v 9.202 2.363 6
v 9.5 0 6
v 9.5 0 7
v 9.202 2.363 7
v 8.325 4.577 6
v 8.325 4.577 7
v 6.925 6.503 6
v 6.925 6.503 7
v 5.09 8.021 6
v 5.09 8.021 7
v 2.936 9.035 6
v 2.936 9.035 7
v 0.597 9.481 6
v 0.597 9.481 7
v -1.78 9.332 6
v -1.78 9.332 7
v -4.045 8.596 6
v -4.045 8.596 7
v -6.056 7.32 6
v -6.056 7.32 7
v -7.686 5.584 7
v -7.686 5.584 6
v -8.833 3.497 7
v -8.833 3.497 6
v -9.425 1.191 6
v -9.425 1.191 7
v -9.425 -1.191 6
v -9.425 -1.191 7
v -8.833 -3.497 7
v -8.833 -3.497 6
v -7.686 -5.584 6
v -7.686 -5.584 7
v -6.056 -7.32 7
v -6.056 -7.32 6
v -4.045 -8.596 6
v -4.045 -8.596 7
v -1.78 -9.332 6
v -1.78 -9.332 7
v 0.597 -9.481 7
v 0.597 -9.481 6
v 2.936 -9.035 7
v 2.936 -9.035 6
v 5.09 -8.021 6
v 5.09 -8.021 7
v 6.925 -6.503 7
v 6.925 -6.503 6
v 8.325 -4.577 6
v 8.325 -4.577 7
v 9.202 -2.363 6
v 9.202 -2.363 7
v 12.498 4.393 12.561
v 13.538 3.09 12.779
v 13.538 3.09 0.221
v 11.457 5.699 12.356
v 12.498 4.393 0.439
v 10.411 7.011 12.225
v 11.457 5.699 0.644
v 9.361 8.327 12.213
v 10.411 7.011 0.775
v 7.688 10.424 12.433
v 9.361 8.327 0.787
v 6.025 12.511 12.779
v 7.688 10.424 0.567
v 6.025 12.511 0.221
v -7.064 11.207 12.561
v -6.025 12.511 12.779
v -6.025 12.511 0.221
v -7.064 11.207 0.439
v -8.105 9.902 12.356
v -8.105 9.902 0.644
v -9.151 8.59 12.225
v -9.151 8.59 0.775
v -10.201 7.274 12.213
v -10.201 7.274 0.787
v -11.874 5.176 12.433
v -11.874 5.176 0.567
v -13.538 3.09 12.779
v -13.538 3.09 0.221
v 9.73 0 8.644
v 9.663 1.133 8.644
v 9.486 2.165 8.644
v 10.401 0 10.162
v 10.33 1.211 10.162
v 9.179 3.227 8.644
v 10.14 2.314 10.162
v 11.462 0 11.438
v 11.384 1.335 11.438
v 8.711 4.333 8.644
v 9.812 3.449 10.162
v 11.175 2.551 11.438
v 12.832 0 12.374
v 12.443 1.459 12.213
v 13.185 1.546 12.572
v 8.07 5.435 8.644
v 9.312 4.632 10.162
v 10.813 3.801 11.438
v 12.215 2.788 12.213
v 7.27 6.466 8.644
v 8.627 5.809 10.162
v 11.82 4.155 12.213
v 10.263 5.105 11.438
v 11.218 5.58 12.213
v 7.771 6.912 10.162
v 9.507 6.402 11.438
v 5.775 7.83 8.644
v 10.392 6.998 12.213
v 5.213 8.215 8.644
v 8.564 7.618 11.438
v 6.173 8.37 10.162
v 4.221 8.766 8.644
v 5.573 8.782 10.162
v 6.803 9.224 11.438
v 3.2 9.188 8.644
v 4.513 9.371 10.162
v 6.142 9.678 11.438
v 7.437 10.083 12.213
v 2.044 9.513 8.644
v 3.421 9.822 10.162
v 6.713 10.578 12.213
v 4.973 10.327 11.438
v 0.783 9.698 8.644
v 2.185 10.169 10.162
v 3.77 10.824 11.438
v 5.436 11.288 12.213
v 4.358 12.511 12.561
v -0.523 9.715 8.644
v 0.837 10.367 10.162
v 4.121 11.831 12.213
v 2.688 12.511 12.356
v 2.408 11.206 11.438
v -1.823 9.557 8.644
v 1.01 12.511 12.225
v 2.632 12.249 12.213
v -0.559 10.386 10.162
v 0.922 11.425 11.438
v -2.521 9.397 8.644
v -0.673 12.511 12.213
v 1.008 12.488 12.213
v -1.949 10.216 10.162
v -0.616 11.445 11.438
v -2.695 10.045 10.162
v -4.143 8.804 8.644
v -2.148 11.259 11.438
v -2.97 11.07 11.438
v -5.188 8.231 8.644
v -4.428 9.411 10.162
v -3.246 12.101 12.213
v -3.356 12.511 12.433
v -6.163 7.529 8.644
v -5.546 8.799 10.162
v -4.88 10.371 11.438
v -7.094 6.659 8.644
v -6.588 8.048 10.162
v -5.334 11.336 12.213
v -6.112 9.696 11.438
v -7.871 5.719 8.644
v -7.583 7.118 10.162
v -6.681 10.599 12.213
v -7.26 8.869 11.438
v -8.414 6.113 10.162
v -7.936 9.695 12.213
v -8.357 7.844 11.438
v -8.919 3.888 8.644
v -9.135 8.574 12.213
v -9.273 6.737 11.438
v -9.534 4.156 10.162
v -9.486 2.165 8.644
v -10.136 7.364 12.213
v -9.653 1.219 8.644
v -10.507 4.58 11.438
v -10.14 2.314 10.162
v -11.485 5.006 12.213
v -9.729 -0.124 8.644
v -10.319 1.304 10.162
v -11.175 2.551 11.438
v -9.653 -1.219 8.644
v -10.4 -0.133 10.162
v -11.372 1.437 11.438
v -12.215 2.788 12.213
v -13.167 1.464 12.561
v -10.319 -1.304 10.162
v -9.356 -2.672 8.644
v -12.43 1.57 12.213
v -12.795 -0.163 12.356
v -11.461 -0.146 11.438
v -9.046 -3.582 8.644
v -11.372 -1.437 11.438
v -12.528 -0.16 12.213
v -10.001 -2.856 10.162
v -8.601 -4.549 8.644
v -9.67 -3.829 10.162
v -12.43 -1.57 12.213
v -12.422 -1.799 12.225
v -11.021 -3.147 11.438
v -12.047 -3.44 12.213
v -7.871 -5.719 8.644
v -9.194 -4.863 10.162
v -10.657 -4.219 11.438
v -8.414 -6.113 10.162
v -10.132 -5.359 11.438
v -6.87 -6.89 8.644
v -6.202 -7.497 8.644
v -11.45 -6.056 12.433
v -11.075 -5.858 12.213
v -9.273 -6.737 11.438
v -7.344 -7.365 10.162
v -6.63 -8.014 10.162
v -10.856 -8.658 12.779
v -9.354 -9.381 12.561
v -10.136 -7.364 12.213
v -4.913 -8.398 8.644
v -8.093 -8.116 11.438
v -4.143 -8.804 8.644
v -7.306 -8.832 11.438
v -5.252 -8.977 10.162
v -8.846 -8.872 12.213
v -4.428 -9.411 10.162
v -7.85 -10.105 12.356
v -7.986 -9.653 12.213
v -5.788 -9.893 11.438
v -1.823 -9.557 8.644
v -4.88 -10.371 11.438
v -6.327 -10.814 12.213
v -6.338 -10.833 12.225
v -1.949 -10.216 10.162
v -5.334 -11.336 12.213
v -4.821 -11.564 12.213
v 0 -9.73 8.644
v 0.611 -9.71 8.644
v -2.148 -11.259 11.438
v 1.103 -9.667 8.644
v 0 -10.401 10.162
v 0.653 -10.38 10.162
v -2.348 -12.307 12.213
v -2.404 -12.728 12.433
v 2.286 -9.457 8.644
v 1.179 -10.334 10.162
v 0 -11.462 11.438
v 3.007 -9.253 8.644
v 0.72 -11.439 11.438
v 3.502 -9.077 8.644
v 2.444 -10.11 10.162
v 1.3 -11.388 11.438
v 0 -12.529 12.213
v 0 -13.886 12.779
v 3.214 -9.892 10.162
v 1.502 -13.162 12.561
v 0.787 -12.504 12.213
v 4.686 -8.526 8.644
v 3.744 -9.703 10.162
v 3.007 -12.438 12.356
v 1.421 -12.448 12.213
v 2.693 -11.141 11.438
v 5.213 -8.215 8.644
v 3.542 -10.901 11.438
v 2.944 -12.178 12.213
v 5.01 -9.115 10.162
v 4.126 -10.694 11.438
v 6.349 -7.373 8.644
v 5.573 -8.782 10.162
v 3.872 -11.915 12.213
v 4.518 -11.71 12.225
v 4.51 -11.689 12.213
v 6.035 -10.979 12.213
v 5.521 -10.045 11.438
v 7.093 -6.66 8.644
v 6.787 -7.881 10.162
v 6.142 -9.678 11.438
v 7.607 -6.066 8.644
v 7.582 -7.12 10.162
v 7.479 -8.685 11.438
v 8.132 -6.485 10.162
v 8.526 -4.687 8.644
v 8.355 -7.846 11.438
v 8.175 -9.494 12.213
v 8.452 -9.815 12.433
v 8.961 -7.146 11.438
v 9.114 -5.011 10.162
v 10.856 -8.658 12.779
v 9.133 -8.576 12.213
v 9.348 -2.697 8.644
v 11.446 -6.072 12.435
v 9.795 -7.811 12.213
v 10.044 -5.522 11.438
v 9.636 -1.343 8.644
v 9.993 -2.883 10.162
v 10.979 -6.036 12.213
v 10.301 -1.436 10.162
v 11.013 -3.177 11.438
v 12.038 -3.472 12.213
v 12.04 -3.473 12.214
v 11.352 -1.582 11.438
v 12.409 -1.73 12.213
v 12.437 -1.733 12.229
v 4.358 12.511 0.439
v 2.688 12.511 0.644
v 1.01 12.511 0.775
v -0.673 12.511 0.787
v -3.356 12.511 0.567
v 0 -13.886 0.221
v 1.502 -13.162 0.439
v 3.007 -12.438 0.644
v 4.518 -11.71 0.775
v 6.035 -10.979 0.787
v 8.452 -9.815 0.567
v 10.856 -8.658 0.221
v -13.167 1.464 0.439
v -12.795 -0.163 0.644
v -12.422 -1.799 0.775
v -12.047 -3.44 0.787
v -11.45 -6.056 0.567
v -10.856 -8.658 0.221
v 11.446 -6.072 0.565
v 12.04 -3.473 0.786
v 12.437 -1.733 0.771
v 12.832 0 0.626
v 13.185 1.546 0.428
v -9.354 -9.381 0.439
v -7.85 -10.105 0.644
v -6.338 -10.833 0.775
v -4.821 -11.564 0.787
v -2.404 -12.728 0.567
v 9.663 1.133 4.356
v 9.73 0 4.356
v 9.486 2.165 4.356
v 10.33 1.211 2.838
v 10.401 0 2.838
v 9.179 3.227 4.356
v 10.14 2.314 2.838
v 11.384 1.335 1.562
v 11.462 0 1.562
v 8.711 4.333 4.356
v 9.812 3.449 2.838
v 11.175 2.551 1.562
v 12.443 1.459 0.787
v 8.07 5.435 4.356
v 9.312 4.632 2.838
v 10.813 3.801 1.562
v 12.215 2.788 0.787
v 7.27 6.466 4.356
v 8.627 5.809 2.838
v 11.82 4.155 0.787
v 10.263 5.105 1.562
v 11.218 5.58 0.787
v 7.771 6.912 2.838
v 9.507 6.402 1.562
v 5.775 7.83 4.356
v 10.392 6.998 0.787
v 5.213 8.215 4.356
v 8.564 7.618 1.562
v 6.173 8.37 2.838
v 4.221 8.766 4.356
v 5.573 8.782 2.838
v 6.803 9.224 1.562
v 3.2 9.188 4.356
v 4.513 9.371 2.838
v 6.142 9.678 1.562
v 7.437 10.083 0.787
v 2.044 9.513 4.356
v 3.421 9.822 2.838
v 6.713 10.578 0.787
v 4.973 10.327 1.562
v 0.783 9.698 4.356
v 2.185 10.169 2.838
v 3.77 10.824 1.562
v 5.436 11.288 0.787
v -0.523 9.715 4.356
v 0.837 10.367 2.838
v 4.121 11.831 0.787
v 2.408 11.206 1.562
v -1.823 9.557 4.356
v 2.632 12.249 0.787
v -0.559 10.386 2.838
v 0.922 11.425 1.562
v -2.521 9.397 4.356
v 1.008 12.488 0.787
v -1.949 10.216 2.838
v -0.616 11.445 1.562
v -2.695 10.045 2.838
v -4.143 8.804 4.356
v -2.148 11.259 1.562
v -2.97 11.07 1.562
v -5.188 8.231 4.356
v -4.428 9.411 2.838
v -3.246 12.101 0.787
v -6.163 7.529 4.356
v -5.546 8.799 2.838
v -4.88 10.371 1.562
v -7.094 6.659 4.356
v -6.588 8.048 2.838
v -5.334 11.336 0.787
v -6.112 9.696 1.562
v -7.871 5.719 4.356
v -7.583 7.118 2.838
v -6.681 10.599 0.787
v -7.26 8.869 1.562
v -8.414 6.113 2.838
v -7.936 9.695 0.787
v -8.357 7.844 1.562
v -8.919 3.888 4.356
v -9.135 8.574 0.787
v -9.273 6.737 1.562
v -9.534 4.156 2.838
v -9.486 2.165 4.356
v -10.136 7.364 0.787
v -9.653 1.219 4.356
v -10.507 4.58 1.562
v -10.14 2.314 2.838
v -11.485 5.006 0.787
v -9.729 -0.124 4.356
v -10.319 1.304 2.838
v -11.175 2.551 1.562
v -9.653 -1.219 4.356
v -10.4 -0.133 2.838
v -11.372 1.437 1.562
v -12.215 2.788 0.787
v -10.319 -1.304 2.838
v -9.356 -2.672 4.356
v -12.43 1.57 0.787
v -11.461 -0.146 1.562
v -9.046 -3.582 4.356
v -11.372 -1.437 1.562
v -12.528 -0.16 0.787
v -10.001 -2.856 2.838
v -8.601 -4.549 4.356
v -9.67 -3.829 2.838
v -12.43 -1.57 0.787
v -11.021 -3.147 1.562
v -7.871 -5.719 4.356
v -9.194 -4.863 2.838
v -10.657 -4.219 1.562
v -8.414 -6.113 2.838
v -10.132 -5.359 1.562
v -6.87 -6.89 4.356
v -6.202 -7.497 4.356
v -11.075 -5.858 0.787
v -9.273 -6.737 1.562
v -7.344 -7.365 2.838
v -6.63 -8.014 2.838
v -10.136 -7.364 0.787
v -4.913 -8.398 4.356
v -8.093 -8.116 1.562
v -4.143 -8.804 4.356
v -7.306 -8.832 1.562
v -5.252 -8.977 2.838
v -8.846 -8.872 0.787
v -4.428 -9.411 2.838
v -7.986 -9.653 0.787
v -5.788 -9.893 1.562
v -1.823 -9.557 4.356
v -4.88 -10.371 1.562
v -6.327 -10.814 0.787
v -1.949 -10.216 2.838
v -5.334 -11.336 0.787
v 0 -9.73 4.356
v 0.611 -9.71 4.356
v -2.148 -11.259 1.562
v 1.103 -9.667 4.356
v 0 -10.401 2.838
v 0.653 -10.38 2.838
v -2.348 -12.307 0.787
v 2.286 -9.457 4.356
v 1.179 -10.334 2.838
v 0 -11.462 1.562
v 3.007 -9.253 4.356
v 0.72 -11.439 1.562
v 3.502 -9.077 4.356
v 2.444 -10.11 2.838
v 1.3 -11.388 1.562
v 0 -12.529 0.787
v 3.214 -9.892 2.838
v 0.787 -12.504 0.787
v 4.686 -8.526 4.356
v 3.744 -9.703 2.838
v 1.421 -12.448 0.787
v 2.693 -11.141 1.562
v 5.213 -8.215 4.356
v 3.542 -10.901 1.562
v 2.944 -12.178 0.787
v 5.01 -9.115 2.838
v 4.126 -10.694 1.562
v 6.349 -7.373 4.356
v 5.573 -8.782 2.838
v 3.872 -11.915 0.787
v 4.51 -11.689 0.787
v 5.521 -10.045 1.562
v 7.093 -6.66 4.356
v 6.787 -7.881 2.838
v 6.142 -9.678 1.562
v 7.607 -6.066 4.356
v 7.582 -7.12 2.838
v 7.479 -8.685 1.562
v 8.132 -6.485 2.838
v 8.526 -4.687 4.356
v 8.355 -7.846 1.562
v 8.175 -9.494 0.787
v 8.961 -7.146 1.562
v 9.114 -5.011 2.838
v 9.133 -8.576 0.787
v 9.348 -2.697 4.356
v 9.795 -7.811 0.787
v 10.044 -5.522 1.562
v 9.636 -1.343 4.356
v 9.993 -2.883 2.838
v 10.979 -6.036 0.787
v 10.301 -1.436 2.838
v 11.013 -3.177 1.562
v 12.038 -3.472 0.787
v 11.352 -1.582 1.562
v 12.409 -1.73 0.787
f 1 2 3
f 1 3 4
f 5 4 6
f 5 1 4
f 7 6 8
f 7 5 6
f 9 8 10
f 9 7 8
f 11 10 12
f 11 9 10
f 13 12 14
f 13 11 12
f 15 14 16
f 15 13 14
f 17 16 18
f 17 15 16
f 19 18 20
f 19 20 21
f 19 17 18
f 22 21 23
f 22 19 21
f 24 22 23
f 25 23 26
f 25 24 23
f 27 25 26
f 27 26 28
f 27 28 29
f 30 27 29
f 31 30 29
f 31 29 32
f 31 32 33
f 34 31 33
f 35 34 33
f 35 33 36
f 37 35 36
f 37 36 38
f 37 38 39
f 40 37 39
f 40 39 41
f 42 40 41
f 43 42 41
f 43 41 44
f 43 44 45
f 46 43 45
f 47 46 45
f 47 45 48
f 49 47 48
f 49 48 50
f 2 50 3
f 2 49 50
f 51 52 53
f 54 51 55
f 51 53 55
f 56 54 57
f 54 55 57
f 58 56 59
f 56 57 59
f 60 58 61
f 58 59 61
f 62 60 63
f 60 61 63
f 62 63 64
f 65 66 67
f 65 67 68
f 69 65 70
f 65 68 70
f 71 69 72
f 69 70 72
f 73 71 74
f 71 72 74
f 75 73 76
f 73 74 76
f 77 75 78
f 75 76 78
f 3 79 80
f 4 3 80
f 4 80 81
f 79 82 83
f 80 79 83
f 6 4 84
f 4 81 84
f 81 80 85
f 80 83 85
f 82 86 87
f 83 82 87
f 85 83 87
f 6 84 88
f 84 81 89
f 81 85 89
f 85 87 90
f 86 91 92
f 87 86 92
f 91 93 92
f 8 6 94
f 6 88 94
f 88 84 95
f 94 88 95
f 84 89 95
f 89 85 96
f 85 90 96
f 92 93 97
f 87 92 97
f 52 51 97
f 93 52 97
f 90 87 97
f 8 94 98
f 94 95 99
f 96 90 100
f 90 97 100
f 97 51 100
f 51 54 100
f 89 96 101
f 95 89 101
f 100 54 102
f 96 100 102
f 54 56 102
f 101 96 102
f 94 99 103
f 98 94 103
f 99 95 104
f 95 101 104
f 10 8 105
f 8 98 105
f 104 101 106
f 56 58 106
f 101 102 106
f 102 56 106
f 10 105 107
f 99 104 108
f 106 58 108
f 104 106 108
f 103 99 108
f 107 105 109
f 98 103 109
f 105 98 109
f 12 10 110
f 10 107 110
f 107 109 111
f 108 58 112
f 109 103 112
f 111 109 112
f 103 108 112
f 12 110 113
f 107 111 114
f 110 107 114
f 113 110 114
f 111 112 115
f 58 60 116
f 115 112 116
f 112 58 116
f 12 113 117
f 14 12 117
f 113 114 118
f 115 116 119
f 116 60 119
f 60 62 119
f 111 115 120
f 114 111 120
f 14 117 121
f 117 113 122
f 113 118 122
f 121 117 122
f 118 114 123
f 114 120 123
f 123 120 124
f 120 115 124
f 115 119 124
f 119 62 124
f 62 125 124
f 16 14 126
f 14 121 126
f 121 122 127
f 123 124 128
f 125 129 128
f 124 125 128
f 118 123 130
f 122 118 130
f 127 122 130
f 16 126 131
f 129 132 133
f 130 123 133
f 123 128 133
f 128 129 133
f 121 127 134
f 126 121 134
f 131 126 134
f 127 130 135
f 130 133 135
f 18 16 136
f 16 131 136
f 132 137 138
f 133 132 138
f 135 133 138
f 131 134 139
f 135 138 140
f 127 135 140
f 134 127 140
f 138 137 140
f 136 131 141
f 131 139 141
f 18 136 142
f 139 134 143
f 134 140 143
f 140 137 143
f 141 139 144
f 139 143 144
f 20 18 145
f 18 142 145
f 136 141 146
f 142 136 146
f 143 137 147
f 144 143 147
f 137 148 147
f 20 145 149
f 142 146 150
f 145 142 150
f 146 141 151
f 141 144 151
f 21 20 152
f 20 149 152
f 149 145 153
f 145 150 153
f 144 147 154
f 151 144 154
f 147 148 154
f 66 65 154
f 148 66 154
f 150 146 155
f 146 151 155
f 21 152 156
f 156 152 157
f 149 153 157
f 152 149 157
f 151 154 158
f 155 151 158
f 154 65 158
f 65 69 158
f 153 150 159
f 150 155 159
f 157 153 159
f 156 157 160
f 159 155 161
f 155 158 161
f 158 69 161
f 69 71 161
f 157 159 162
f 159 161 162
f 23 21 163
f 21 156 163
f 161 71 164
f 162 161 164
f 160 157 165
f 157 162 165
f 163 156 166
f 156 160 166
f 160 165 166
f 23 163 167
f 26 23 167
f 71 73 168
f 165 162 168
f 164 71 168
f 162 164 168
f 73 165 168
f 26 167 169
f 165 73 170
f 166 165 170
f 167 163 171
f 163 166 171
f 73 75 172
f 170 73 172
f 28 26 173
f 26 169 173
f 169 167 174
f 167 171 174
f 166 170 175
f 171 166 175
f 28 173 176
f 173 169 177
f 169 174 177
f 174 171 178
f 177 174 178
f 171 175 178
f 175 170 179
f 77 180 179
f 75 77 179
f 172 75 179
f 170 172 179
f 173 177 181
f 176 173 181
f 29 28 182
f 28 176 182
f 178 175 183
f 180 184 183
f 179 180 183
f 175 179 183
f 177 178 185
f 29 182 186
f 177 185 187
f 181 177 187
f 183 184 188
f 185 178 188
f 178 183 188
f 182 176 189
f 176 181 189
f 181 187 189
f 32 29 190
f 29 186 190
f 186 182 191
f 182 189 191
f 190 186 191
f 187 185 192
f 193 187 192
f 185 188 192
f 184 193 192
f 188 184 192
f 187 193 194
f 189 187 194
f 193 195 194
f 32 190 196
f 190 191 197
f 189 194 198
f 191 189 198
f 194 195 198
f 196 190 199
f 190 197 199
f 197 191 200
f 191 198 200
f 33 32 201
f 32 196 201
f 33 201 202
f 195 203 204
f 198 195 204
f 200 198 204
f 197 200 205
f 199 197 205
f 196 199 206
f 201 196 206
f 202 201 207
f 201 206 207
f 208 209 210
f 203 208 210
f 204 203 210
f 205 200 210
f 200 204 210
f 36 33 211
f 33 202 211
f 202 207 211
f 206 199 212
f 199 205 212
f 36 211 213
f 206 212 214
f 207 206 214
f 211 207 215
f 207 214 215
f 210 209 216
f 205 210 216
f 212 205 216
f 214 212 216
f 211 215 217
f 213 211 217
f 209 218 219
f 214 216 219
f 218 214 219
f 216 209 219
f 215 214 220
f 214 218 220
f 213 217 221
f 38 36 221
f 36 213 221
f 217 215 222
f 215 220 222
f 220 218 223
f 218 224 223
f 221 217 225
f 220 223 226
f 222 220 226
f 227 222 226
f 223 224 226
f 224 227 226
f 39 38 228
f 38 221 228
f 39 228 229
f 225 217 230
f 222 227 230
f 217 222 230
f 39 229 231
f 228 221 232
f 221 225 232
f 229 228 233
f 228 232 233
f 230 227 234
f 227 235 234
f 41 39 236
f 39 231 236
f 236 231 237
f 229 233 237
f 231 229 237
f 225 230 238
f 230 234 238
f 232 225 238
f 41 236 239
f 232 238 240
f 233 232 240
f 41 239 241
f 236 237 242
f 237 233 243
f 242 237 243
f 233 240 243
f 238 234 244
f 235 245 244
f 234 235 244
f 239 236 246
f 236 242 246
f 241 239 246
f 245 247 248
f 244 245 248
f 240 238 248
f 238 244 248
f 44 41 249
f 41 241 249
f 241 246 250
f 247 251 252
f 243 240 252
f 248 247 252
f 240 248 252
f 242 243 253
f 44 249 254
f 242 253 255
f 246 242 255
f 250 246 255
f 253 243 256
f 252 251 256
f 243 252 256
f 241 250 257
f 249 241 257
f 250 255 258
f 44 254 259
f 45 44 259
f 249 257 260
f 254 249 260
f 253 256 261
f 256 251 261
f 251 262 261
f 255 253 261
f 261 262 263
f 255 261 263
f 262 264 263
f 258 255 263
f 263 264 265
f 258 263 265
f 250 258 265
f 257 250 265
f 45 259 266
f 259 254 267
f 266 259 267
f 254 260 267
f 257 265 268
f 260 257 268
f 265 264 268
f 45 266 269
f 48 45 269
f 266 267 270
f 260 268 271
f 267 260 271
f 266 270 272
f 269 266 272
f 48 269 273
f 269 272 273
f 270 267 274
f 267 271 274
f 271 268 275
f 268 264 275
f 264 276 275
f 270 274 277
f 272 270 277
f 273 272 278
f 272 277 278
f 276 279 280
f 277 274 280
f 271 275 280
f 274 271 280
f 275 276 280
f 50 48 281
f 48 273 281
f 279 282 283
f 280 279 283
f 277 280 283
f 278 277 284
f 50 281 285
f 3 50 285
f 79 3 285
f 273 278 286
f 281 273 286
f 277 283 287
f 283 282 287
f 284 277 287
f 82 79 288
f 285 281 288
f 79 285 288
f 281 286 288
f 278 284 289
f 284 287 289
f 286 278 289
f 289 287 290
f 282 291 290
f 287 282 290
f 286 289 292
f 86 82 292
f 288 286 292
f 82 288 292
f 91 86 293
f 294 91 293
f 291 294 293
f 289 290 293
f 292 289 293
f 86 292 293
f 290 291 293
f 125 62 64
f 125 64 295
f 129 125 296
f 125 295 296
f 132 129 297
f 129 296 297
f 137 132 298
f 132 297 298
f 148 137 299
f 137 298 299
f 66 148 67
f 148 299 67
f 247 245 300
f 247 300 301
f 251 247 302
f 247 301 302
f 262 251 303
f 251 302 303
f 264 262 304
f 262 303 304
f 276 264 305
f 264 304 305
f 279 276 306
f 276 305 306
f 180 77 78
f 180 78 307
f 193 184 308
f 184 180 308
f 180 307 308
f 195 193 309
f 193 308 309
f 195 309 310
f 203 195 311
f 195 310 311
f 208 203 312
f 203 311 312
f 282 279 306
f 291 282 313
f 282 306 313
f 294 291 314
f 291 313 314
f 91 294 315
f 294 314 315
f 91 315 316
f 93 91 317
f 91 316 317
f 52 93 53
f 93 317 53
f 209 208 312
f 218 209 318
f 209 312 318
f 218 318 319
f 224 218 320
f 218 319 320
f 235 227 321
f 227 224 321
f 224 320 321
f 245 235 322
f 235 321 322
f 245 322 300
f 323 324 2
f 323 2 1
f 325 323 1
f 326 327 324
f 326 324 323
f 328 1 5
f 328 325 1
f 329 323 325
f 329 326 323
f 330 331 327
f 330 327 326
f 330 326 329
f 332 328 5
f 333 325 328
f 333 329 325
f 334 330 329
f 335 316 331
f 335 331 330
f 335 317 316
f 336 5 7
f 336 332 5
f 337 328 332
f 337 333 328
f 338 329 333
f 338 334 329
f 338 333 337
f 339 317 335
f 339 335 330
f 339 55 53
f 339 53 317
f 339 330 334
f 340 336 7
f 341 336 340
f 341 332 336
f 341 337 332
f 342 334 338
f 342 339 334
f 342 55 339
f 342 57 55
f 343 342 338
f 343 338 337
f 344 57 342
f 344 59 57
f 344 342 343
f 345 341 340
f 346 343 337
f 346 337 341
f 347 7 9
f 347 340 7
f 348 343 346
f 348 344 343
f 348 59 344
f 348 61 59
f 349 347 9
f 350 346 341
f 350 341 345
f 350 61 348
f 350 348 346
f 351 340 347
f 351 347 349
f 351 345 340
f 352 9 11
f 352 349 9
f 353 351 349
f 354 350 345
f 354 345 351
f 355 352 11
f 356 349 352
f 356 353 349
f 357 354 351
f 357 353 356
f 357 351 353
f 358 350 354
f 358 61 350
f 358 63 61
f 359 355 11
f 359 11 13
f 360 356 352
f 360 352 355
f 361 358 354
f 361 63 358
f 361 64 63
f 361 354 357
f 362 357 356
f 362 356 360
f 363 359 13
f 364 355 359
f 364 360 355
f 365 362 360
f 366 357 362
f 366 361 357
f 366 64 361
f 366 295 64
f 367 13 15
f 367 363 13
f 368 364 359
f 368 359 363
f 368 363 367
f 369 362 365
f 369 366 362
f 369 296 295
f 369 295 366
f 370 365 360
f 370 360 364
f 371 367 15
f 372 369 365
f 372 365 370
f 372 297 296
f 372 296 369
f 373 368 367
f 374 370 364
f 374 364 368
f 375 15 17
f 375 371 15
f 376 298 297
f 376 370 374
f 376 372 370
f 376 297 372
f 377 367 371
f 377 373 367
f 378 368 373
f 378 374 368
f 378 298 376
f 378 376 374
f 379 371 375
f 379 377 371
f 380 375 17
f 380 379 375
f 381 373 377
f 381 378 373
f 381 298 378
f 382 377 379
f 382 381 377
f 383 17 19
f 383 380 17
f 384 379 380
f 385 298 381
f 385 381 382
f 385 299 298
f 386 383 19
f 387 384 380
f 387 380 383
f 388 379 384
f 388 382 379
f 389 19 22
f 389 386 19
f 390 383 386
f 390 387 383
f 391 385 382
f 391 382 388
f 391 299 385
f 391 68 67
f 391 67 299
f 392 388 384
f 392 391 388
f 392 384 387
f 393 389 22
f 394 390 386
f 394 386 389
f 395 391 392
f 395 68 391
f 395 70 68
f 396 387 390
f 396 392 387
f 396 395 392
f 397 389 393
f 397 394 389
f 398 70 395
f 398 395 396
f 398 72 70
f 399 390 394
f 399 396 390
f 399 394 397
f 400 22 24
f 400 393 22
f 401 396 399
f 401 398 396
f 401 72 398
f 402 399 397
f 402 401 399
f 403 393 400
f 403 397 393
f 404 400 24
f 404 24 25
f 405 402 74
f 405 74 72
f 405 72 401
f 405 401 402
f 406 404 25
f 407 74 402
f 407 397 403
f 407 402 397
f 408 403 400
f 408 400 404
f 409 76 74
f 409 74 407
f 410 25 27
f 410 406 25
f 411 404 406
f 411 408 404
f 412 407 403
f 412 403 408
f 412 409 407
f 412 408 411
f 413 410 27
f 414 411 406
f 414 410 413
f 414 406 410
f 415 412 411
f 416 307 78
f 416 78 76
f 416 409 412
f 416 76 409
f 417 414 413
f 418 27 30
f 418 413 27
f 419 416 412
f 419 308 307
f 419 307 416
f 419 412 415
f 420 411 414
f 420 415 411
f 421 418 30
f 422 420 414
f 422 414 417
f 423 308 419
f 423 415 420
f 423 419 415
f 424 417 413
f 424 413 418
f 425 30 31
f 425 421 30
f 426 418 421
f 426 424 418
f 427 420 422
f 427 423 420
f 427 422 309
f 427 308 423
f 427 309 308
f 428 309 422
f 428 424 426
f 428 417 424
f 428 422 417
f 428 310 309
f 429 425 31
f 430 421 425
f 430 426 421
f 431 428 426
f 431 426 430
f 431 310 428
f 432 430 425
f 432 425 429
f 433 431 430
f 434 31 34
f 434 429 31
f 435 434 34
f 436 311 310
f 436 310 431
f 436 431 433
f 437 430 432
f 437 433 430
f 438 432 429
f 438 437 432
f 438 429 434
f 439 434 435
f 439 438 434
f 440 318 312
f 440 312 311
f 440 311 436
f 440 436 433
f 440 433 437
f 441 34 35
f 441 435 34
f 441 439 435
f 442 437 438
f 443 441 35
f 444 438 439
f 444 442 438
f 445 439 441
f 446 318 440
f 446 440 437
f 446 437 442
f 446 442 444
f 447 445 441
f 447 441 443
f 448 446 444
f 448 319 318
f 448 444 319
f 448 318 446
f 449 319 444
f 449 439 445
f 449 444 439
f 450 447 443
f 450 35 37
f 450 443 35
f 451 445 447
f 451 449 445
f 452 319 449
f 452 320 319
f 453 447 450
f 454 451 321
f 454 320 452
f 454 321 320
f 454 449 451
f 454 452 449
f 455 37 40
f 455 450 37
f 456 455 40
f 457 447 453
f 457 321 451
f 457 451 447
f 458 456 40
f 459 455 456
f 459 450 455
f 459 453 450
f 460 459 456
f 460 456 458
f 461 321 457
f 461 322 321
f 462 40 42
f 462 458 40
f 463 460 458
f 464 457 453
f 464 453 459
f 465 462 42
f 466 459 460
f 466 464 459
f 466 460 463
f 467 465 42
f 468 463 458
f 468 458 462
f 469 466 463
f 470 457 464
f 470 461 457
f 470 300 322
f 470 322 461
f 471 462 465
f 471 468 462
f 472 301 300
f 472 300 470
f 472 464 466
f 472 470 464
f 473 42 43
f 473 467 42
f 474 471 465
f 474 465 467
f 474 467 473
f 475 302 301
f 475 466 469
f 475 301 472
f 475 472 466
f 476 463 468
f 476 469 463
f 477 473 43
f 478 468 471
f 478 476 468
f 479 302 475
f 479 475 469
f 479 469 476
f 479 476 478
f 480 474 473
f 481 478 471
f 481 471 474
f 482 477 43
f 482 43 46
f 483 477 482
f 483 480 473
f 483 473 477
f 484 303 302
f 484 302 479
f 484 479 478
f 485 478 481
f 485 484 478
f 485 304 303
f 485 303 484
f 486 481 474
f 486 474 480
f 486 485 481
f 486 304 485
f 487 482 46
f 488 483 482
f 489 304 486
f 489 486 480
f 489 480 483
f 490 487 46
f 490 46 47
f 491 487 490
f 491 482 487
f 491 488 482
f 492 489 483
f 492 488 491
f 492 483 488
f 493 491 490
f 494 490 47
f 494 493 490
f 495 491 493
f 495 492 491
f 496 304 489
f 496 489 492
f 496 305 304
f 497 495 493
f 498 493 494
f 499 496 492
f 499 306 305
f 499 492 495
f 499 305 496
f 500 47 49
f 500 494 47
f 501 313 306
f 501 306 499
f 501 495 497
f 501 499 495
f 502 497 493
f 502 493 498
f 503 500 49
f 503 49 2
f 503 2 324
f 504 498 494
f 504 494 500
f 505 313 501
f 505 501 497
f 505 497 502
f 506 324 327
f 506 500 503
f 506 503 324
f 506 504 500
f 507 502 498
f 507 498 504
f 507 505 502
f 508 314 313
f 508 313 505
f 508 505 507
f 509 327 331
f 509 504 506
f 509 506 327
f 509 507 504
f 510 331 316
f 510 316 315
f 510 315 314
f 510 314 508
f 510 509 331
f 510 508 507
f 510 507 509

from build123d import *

# Parameters (mm, degrees)
F0_R     = 9.5
F1_DEPTH = 13


# Not quite as in the source:
# - a fillet or chamfer that OpenCascade refuses, or shapes differently, is made with other operations: its cross-section is extruded or revolved along the edge and cut away or added


with BuildPart() as f1:
    # F0 (on Top) → F1 (new body)
    with BuildSketch(Plane.XY):
        Polygon((6.024763409, 12.5105501281), (-6.024763409, 12.5105501281), (-13.5375204973, 3.0898507129), (-10.856248536, -8.6575693106), (0, -13.885663061), (10.856248536, -8.6575693106), (13.5375204973, 3.0898507129), align=None)
        Circle(F0_R, mode=Mode.SUBTRACT)
    extrude(amount=F1_DEPTH)

    # F2: fillet of radius 6 on 3 edges, made by hand

    # F2_s1 → F2_t2 (revolve, cut)
    with BuildSketch(Plane.XZ):
        with BuildLine():
            ThreePointArc((9.5, 6), (11.2573593129, 1.7573593129), (15.5, 0))
            Line((15.5, 0), (9.5, 0))
            Line((9.5, 0), (9.5, 6))
        make_face()
    revolve(axis=Axis((0, 0, 0), (0, 0, 1)), mode=Mode.SUBTRACT)

    # F2_s3 → F2_t4 (revolve, cut)
    with BuildSketch(Plane.XZ):
        with BuildLine():
            ThreePointArc((9.5, 7), (11.2573593129, 11.2426406871), (15.5, 13))
            Line((15.5, 13), (9.5, 13))
            Line((9.5, 13), (9.5, 7))
        make_face()
    revolve(axis=Axis((0, 0, 13), (0, 0, 1)), mode=Mode.SUBTRACT)


solid = f1.part
